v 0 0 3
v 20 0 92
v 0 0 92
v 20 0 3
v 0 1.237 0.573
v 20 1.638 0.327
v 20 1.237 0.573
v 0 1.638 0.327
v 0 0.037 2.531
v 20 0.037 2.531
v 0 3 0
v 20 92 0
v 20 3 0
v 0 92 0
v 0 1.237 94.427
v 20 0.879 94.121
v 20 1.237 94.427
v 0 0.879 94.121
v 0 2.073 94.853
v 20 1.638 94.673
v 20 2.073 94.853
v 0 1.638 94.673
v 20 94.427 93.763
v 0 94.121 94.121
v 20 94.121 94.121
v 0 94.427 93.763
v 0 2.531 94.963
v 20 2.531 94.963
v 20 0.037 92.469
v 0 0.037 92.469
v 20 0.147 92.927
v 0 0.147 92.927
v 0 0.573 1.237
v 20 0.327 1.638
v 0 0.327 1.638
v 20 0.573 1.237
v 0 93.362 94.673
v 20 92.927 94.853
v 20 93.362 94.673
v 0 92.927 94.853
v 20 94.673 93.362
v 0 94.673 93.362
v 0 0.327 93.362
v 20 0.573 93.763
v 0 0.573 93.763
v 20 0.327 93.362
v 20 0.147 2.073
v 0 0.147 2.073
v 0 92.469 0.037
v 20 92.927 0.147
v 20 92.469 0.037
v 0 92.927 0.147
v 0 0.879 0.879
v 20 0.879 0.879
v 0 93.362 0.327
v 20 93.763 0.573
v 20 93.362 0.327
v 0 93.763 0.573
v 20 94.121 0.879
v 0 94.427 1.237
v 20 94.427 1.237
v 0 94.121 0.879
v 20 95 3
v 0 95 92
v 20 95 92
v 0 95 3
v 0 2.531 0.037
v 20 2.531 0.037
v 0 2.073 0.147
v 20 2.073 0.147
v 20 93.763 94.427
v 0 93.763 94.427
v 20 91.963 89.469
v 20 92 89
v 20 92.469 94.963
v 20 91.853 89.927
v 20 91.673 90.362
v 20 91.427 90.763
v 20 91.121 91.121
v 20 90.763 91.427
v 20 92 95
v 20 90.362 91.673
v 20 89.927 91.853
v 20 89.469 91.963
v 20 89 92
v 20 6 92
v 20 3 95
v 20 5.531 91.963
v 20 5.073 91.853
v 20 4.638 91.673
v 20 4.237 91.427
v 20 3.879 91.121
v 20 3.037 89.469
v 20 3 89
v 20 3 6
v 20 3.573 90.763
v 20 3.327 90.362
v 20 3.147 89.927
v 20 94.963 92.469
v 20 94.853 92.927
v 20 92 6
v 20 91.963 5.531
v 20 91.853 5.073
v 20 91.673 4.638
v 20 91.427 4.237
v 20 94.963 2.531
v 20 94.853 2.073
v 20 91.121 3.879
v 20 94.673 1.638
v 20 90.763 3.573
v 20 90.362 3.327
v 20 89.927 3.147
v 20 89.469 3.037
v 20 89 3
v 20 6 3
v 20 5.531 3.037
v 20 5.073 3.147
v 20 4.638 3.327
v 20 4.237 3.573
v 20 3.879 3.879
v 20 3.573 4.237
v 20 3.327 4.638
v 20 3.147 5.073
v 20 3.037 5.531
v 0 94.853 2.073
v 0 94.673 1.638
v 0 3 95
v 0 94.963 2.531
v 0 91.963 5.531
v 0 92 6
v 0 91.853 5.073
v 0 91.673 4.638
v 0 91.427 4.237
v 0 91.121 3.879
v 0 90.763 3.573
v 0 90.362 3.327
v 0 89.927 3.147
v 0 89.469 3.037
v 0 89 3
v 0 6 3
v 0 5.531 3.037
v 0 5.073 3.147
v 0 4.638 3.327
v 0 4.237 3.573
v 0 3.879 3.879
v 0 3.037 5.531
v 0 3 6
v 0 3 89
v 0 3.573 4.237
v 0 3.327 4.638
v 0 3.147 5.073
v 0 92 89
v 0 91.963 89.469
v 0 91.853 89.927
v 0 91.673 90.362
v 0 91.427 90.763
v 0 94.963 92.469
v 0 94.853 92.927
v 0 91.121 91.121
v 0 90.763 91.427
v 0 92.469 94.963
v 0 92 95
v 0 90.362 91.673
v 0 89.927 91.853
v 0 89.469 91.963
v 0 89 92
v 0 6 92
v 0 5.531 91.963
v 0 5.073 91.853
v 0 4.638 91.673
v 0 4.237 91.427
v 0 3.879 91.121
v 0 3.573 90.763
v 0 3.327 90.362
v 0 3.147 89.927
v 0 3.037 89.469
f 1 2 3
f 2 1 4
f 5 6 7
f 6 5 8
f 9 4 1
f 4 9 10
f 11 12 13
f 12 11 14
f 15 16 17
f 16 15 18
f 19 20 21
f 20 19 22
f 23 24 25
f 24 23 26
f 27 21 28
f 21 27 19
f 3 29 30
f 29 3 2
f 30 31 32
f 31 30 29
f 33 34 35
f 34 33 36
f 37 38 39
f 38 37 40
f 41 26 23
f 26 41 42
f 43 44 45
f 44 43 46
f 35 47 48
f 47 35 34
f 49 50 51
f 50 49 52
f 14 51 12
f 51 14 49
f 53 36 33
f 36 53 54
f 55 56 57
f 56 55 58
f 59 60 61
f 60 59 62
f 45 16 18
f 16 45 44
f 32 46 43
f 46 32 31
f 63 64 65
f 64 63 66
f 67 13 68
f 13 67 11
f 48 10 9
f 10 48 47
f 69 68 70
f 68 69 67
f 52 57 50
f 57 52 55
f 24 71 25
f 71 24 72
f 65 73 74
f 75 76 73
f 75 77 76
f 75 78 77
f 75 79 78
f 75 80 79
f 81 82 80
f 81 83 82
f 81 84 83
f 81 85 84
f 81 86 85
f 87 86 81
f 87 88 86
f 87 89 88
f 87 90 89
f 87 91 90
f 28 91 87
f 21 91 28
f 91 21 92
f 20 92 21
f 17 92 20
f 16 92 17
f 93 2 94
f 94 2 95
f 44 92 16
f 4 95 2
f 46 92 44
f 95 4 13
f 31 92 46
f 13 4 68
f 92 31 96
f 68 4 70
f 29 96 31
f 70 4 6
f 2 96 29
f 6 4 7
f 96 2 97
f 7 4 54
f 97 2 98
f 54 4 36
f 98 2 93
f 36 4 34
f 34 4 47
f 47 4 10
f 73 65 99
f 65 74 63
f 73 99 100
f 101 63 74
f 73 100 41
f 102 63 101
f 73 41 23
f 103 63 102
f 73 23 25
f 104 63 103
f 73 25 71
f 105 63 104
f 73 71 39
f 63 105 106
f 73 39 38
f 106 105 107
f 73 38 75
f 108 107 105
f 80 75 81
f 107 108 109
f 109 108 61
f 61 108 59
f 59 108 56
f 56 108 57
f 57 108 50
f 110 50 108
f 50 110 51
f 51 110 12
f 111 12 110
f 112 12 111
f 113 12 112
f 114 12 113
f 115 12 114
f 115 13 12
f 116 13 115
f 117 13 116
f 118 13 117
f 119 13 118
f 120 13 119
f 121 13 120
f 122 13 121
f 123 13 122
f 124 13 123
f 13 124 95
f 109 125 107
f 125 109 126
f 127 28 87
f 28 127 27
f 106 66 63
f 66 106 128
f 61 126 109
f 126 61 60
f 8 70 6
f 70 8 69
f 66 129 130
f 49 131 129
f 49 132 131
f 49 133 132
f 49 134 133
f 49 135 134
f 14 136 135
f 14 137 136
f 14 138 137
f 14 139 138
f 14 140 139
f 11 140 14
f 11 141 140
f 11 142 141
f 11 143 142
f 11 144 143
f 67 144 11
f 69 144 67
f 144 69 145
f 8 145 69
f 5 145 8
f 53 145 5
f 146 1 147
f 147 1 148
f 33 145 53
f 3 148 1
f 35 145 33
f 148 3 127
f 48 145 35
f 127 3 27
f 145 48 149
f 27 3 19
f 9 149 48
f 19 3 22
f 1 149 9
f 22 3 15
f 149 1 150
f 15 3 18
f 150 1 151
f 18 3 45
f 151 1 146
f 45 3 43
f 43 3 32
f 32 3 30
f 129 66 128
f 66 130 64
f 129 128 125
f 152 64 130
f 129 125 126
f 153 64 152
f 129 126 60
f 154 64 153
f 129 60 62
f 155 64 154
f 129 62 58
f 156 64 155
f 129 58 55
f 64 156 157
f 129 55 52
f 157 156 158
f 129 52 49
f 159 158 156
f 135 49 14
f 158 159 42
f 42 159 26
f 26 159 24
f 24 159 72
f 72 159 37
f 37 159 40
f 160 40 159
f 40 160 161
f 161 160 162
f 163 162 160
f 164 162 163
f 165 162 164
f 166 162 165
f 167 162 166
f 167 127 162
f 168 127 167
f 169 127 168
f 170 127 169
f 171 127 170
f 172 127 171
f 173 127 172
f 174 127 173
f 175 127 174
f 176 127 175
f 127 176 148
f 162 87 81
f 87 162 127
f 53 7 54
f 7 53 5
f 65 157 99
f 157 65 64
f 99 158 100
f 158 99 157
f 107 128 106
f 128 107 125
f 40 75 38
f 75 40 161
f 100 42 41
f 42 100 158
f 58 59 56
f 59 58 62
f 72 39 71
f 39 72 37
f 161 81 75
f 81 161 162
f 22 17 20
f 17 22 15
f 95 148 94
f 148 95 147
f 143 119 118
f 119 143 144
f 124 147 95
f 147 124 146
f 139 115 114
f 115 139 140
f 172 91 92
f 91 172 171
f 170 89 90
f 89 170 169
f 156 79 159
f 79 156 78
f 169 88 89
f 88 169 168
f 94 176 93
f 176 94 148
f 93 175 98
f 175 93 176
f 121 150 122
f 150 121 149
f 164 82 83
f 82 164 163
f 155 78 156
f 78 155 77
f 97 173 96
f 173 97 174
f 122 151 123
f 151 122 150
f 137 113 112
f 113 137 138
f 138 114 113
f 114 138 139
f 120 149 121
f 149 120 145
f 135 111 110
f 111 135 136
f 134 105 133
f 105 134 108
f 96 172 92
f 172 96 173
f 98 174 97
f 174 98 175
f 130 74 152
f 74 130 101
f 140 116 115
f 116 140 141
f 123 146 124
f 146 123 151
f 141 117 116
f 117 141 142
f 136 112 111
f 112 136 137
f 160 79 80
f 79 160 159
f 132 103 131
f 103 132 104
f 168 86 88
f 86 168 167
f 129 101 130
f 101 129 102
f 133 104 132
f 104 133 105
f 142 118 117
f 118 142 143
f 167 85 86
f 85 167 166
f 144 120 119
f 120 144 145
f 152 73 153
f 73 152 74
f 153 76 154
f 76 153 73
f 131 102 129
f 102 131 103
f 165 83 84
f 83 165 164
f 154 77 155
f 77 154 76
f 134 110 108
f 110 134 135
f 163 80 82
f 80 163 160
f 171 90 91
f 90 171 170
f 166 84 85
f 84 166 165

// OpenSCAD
// Scooter Under Bed Stand Box
// Dimensions: 200mm (L) x 95mm (W) x 95mm (H)

// Parameters (in mm)
length = 20;              // 20 cm
width = 95;                // 9.5 cm
height = 95;               // 9.5 cm
wall_thickness = 3;        // Wall thickness for hollow design
fillet_radius = 3;        // Outer fillet radius (in mm)
inner_fillet_radius = 3;  // Inner fillet radius (in mm)

// Set to true for hollow (lighter, less filament)
// Set to false for solid block
hollow = true;

// Resolution for smooth curves
$fn = 40;

// Module to create a rounded box with flat/blunt ends
// Uses cylinders along length so ends are flat, only long edges are rounded
module rounded_box(l, w, h, r) {
    hull() {
        // Four cylinders running along the length for rounded long edges
        translate([0, r, r])
            rotate([0, 90, 0]) cylinder(h = l, r = r);
        translate([0, w - r, r])
            rotate([0, 90, 0]) cylinder(h = l, r = r);
        translate([0, r, h - r])
            rotate([0, 90, 0]) cylinder(h = l, r = r);
        translate([0, w - r, h - r])
            rotate([0, 90, 0]) cylinder(h = l, r = r);
    }
}

module solid_box() {
    rounded_box(length, width, height, fillet_radius);
}

// Module for rounded tunnel (cylinder-based for inner corners)
module rounded_tunnel(l, w, h, r) {
    hull() {
        // Four rounded corners running along the length
        translate([-1, r, r])
            rotate([0, 90, 0]) cylinder(h = l + 2, r = r);
        translate([-1, w - r, r])
            rotate([0, 90, 0]) cylinder(h = l + 2, r = r);
        translate([-1, r, h - r])
            rotate([0, 90, 0]) cylinder(h = l + 2, r = r);
        translate([-1, w - r, h - r])
            rotate([0, 90, 0]) cylinder(h = l + 2, r = r);
    }
}

module hollow_box() {
    inner_width = width - 2*wall_thickness;
    inner_height = height - 2*wall_thickness;

    difference() {
        // Outer rounded shell
        rounded_box(length, width, height, fillet_radius);

        // Inner rounded tunnel cutout - open on both ends with rounded inside corners
        translate([0, wall_thickness, wall_thickness])
            rounded_tunnel(length, inner_width, inner_height, inner_fillet_radius);
    }
}

module reinforced_hollow_box() {
    // Hollow box with internal divider ribs for strength
    rib_thickness = 2;  // Thickness of each divider
    num_ribs = 3;       // Number of internal dividers
    rib_spacing = length / (num_ribs + 1);

    union() {
        hollow_box();

        // Add internal divider ribs spanning the tunnel
        for (i = [1:num_ribs]) {
            translate([i * rib_spacing - rib_thickness/2, wall_thickness, wall_thickness])
                cube([
                    rib_thickness,
                    width - 2*wall_thickness,
                    height - 2*wall_thickness
                ]);
        }
    }
}

// Render the box
// Options: solid_box(), hollow_box(), reinforced_hollow_box()
if (hollow) {
    hollow_box();  // No dividers, rounded inside and outside
    // reinforced_hollow_box();  // Uncomment for dividers
} else {
    solid_box();
}

// Preview info (shown in console)
echo(str("Box dimensions: ", length, "mm x ", width, "mm x ", height, "mm"));
echo(str("              : ", length/10, "cm x ", width/10, "cm x ", height/10, "cm"));
